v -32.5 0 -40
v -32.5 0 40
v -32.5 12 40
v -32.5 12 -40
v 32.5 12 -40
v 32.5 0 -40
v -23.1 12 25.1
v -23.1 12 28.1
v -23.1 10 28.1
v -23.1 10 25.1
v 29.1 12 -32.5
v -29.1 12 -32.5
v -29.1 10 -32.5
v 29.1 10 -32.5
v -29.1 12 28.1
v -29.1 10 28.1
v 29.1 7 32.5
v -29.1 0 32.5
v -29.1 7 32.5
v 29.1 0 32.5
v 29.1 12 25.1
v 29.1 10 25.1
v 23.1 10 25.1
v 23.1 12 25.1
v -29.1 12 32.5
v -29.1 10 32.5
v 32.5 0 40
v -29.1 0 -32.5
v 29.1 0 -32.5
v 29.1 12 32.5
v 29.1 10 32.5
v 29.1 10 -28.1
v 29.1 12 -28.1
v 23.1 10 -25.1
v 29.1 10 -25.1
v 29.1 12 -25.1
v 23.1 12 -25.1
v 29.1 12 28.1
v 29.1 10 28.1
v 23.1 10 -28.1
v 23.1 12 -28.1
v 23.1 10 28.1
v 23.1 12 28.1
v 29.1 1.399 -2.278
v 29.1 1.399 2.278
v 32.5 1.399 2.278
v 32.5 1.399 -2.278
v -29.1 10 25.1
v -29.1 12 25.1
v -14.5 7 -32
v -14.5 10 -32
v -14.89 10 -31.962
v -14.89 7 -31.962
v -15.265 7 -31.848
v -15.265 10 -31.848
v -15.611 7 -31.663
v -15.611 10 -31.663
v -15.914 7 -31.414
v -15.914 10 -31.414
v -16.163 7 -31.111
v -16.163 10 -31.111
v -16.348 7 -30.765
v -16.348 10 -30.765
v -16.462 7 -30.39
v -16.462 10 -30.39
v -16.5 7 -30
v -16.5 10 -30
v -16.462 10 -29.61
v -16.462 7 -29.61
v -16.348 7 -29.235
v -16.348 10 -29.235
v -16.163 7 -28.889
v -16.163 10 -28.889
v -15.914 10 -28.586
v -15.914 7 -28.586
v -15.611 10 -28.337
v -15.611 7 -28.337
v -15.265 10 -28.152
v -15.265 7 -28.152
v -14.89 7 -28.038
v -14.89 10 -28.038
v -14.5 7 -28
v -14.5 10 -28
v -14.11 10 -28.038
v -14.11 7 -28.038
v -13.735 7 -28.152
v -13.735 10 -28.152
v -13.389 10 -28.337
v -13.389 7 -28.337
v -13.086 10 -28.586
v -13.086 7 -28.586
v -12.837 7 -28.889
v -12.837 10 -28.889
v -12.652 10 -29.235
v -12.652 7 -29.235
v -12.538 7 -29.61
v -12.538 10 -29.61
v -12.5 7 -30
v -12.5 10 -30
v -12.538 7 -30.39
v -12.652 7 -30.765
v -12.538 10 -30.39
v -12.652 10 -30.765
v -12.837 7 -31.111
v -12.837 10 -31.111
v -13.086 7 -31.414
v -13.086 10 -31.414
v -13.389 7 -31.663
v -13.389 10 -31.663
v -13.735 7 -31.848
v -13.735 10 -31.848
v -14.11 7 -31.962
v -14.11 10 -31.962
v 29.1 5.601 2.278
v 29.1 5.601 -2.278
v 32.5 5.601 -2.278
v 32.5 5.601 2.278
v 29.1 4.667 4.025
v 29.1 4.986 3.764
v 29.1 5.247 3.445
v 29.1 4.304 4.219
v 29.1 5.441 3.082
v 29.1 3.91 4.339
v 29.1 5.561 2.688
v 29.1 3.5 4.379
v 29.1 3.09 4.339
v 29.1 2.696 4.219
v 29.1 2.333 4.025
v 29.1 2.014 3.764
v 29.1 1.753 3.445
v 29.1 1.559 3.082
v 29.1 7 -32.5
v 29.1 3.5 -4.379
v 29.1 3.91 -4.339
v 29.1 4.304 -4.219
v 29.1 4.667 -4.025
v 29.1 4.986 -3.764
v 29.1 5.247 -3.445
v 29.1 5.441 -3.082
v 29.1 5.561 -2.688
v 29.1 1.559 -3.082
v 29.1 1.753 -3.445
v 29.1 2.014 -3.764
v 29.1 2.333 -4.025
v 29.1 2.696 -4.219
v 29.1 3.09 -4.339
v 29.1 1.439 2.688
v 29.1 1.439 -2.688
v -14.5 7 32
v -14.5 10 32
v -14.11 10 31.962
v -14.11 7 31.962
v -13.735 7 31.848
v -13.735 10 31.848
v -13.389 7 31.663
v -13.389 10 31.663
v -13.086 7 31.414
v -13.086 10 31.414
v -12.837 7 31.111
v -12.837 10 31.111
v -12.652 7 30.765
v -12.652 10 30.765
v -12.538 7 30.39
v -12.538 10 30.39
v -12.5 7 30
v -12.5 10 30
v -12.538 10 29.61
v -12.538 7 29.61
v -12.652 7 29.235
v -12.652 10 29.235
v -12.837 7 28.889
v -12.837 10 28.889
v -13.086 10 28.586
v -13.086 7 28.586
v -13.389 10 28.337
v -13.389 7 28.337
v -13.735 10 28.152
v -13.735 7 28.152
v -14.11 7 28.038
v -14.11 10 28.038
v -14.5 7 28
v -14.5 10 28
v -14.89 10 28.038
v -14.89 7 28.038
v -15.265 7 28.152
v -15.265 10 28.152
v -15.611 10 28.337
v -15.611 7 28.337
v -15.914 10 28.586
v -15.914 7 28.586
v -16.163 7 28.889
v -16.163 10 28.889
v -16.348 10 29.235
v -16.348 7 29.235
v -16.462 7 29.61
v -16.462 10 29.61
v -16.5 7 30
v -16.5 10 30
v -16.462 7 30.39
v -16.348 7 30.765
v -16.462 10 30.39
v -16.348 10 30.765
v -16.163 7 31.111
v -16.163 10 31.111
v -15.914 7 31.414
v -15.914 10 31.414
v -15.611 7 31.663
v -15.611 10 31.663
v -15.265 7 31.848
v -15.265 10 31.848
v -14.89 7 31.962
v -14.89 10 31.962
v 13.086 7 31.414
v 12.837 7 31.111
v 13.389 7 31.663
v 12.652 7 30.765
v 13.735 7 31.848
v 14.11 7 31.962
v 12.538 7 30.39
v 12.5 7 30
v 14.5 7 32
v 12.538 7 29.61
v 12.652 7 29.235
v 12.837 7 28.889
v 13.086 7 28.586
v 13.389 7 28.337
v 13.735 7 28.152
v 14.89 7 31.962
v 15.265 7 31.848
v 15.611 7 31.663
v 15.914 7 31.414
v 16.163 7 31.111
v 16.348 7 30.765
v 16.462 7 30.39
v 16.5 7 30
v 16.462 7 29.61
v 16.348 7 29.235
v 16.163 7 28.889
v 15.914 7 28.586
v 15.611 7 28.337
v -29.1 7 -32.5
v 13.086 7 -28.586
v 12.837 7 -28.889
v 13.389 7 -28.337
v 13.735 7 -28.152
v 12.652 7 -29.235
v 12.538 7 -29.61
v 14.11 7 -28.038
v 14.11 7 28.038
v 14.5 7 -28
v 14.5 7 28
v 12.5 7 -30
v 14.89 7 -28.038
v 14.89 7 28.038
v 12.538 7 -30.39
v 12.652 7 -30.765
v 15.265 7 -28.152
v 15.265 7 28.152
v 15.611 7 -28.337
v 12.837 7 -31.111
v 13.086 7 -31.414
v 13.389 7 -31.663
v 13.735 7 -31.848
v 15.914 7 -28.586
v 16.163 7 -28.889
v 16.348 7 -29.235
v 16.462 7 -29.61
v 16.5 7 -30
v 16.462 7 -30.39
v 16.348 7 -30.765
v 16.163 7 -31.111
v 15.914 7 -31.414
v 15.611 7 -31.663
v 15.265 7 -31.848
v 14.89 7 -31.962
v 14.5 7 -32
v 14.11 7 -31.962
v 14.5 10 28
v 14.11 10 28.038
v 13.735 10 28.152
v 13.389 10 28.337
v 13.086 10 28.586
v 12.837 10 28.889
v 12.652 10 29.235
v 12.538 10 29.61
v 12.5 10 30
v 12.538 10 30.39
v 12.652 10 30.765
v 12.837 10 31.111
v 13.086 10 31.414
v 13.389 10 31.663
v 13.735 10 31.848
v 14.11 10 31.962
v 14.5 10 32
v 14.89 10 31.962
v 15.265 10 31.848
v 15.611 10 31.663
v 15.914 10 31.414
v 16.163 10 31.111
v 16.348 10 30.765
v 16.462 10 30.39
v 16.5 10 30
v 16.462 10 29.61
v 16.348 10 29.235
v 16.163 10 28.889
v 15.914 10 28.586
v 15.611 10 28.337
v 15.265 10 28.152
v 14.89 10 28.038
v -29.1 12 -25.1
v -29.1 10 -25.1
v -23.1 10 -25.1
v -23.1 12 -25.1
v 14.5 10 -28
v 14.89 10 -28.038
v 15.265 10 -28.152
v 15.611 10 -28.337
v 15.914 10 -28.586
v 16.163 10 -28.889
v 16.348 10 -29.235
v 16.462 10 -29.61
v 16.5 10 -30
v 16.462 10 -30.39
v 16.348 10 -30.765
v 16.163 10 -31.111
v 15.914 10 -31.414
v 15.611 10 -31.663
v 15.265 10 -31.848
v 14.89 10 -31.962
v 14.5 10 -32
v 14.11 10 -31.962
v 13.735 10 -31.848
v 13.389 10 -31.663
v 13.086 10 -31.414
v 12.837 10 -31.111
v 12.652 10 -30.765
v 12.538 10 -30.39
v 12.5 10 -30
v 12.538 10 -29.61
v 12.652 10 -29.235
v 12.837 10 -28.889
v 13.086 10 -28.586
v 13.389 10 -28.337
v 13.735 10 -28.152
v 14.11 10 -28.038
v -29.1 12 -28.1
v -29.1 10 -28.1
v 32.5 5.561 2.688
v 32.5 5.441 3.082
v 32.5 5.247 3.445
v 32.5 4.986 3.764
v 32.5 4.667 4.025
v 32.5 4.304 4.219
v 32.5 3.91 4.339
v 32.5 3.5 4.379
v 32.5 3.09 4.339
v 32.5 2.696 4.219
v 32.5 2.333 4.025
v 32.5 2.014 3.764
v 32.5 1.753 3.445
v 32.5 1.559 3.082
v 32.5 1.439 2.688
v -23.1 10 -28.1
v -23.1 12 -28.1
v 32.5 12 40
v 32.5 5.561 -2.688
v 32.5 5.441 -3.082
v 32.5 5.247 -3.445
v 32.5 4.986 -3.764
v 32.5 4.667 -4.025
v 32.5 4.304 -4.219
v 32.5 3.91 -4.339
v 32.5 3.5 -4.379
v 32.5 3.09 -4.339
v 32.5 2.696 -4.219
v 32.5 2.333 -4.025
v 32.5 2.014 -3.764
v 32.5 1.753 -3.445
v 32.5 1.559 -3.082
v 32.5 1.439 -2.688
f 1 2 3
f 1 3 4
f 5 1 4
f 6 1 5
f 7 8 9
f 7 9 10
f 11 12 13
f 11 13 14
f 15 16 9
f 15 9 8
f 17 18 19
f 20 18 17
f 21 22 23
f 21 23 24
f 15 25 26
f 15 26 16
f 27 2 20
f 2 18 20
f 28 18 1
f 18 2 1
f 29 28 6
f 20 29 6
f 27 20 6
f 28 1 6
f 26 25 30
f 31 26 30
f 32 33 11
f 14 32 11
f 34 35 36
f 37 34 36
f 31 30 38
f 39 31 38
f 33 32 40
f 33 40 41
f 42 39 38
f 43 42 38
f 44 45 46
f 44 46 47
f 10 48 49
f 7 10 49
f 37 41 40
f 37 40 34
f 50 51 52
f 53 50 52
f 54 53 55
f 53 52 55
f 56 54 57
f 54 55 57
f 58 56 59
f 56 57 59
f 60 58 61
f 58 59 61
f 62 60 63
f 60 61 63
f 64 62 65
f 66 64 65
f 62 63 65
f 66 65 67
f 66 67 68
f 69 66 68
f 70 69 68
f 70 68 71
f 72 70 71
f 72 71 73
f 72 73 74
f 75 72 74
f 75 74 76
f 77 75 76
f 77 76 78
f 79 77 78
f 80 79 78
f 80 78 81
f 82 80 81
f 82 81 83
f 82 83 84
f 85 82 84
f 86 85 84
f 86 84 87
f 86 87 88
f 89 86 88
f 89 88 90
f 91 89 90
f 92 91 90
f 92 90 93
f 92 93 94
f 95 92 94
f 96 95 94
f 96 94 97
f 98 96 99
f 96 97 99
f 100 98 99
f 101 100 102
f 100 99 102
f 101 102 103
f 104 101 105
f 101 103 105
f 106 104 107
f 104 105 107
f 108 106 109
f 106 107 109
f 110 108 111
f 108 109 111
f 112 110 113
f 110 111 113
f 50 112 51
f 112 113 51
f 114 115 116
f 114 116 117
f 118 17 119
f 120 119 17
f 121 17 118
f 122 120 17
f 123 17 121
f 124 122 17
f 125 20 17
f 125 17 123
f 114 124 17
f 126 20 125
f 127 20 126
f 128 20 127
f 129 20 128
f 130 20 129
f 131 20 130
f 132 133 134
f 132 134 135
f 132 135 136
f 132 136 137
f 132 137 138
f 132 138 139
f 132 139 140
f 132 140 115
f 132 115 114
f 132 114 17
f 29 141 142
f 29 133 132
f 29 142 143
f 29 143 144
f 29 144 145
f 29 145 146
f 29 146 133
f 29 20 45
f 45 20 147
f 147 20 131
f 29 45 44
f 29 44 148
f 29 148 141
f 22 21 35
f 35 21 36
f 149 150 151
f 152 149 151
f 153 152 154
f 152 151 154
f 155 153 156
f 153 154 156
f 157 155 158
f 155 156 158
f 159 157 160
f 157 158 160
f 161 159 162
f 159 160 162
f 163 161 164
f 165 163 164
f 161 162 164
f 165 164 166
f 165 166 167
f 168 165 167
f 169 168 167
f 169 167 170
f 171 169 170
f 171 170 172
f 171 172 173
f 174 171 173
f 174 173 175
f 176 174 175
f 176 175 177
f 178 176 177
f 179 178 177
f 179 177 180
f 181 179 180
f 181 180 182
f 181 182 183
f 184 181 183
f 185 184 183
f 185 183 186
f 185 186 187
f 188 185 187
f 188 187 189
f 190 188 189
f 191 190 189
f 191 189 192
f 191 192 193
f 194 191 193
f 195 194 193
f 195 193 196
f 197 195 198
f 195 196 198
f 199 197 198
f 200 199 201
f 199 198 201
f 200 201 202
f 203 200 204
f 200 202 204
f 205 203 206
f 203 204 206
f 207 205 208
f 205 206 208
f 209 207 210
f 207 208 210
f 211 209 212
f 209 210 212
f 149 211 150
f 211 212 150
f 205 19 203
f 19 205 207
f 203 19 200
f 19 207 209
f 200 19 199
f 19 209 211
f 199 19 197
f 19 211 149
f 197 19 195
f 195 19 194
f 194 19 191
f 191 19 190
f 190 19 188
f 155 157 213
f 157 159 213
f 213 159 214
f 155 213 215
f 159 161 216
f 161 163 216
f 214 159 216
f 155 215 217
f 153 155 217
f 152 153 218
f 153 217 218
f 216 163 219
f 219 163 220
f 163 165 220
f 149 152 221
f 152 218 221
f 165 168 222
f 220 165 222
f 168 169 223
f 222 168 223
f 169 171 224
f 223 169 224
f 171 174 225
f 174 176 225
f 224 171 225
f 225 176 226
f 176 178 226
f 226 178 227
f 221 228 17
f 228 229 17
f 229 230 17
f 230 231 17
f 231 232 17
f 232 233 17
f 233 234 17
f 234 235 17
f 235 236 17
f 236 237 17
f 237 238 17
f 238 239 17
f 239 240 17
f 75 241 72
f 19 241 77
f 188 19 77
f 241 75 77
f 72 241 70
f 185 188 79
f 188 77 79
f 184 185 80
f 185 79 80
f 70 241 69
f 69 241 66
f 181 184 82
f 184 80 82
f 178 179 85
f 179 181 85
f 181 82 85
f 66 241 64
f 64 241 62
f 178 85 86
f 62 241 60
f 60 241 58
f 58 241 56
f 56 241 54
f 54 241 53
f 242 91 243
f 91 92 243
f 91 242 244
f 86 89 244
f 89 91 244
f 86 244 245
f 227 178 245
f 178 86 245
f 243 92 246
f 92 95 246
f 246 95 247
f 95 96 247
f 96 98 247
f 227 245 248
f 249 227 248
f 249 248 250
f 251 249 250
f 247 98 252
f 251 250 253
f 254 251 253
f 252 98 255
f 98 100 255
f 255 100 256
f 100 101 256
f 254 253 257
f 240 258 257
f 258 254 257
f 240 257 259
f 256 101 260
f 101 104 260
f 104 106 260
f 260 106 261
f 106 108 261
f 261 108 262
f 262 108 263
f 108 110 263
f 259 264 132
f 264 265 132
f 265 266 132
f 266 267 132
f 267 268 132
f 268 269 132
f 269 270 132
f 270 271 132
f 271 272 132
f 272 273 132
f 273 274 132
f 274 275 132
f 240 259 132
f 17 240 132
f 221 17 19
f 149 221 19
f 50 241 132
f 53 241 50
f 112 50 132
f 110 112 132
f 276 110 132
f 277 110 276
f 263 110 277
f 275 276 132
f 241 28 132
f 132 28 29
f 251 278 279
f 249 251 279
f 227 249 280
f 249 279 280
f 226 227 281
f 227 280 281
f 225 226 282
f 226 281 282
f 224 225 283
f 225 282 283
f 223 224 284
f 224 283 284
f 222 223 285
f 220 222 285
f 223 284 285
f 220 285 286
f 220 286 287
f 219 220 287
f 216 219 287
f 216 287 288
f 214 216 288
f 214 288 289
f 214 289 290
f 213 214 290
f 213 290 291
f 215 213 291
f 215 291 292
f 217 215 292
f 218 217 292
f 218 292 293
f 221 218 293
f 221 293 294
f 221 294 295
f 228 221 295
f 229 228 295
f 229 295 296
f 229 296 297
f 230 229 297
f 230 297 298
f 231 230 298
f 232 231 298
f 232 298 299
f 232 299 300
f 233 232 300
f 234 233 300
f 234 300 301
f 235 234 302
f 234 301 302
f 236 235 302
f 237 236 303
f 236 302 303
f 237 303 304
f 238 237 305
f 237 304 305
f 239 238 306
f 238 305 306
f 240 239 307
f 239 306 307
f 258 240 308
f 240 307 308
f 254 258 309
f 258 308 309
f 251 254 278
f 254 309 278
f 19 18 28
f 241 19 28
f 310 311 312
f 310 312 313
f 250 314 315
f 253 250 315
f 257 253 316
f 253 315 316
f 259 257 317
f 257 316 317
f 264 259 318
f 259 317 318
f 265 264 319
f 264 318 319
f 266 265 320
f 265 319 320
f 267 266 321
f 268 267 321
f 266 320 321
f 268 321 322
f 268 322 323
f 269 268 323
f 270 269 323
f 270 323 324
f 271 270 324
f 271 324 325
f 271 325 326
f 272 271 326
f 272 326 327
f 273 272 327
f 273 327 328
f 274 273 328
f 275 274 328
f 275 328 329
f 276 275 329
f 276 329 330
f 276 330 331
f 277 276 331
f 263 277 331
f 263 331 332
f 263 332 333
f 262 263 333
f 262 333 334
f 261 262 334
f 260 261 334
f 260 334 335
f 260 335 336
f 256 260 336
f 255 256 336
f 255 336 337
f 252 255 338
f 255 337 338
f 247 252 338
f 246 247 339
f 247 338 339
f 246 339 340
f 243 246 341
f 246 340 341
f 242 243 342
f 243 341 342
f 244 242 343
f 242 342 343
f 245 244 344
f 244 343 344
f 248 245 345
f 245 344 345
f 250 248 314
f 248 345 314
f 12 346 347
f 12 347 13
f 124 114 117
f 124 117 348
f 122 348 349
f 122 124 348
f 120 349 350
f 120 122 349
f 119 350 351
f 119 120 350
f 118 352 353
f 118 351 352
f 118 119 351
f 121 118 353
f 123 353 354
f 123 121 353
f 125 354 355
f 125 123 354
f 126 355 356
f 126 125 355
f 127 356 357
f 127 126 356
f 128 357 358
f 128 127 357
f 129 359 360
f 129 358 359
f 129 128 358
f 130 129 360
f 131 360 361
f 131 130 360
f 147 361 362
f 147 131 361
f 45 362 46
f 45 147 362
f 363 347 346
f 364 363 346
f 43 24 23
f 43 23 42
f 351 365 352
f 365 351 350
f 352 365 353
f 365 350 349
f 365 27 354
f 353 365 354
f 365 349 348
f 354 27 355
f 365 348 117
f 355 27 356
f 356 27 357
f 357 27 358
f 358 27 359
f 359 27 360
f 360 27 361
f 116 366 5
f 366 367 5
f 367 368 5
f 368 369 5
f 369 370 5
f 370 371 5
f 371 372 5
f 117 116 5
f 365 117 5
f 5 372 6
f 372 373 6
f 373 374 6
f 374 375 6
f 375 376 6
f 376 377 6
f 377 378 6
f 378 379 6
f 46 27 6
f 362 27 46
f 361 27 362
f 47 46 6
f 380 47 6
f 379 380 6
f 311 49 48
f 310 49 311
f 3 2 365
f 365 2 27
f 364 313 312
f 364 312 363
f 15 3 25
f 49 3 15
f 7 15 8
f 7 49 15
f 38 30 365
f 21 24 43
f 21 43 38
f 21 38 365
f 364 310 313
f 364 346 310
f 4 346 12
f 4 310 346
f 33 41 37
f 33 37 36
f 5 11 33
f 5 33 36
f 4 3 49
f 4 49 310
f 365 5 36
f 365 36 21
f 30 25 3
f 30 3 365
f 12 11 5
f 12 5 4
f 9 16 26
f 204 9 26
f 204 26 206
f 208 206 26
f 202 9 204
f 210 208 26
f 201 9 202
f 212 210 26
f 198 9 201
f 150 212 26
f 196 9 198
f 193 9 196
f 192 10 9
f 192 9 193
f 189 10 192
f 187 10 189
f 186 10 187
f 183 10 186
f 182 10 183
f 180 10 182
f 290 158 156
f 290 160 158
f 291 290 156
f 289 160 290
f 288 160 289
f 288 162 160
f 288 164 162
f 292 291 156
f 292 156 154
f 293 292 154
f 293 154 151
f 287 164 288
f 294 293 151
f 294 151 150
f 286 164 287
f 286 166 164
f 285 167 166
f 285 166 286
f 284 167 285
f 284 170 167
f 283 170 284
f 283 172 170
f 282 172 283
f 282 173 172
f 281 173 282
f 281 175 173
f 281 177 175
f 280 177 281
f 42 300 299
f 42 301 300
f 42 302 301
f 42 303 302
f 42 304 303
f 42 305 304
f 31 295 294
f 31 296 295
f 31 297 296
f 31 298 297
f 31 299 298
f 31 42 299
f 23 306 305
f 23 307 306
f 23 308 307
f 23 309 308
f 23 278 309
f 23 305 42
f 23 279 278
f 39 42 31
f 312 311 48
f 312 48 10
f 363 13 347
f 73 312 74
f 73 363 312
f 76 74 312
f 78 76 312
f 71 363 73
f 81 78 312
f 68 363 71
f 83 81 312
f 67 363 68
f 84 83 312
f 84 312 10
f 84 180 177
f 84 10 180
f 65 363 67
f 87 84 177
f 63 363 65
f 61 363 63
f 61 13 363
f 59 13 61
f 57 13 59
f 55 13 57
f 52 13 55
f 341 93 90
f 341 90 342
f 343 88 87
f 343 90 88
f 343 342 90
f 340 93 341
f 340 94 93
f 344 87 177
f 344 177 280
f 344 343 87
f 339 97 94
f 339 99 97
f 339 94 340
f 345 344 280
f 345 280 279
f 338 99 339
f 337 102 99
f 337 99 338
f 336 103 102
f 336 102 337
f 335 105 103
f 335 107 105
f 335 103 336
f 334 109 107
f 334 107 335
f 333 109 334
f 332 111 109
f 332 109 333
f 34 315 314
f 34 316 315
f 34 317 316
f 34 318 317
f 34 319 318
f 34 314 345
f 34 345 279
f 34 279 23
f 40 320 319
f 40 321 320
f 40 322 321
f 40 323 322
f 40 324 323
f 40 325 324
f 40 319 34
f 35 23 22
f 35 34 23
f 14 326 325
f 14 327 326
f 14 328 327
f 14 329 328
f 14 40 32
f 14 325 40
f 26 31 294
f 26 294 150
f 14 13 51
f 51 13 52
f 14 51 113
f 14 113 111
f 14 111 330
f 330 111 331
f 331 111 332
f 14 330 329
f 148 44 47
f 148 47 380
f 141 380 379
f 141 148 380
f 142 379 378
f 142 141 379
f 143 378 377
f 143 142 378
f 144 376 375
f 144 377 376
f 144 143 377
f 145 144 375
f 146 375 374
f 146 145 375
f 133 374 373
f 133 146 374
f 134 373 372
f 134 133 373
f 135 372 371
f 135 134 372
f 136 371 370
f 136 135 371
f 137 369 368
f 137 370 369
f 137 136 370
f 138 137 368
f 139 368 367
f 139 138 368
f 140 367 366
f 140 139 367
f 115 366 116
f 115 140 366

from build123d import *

# Parameters (mm, degrees)
SKETCH1_W           = 65
SKETCH1_H           = 80
BOSS_EXTRUDE1_DEPTH = 12
SKETCH3_W           = 58.2
SKETCH3_H           = 65
CUT_EXTRUDE4_DEPTH  = 2
SKETCH6_R           = 2
CUT_EXTRUDE5_DEPTH  = 10
SKETCH7_W           = 58.2
SKETCH7_H           = 65
CUT_EXTRUDE6_DEPTH  = 7
CUT_EXTRUDE8_DEPTH  = 6
SKETCH11_W          = 3
SKETCH11_H          = 2
BOSS_EXTRUDE3_DEPTH = 6
SKETCH13_W          = 3
SKETCH13_H          = 2
BOSS_EXTRUDE4_DEPTH = 6


with BuildPart() as part:
    # Sketch1 → Boss-Extrude1 (new body)
    with BuildSketch(Plane(origin=(0, 0, 0), x_dir=(1, 0, 0), z_dir=(0, 1, 0))):
        Rectangle(SKETCH1_W, SKETCH1_H)
    extrude(amount=BOSS_EXTRUDE1_DEPTH)

    # Sketch3 → Cut-Extrude4 (cut)
    with BuildSketch(Plane(origin=(0, 12, 0), x_dir=(1, 0, 0), z_dir=(0, 1, 0))):
        Rectangle(SKETCH3_W, SKETCH3_H)
    extrude(amount=-CUT_EXTRUDE4_DEPTH, mode=Mode.SUBTRACT)

    # Sketch6 → Cut-Extrude5 (cut)
    with BuildSketch(Plane(origin=(0, 10, 0), x_dir=(1, 0, 0), z_dir=(0, 1, 0))):
        with Locations(Location((14.5, 30, 0), (0, 0, 270))):  # turned: the seam where the file's is
            Circle(SKETCH6_R)
        with Locations(Location((-14.5, 30, 0), (0, 0, 90))):  # turned: the seam where the file's is
            Circle(SKETCH6_R)
        with Locations(Location((-14.5, -30, 0), (0, 0, 270))):  # turned: the seam where the file's is
            Circle(SKETCH6_R)
        with Locations(Location((14.5, -30, 0), (0, 0, 90))):  # turned: the seam where the file's is
            Circle(SKETCH6_R)
    extrude(amount=-CUT_EXTRUDE5_DEPTH, mode=Mode.SUBTRACT)

    # Sketch7 → Cut-Extrude6 (cut)
    with BuildSketch(Plane(origin=(0, 0, 0), x_dir=(1, 0, 0), z_dir=(0, 1, 0))):
        Rectangle(SKETCH7_W, SKETCH7_H)
    extrude(amount=CUT_EXTRUDE6_DEPTH, mode=Mode.SUBTRACT)

    # Sketch10 → Cut-Extrude8 (cut)
    with BuildSketch(Plane.ZY.offset(-29.1)):
        with BuildLine():
            Line((-2.277690302, 5.601430768), (2.277690302, 5.601430768))
            ThreePointArc((2.277690302, 5.601430768), (4.379121071, 3.5), (2.277690302, 1.398569232))
            Line((2.277690302, 1.398569232), (-2.277690302, 1.398569232))
            ThreePointArc((-2.277690302, 1.398569232), (-4.379121071, 3.5), (-2.277690302, 5.601430768))
        make_face()
    extrude(amount=-CUT_EXTRUDE8_DEPTH, mode=Mode.SUBTRACT)

    # Sketch11 → Boss-Extrude3 (add)
    with BuildSketch(Plane.ZY.offset(-29.1)):
        with Locations((-26.6, 11)):
            Rectangle(SKETCH11_W, SKETCH11_H)
        with Locations((26.6, 11)):
            Rectangle(SKETCH11_W, SKETCH11_H)
    extrude(amount=BOSS_EXTRUDE3_DEPTH)

    # Sketch13 → Boss-Extrude4 (add)
    with BuildSketch(Plane(origin=(-29.1, 0, 0), x_dir=(0, 0, -1), z_dir=(1, 0, 0))):
        with Locations((26.6, 11)):
            Rectangle(SKETCH13_W, SKETCH13_H)
        with Locations((-26.6, 11)):
            Rectangle(SKETCH13_W, SKETCH13_H)
    extrude(amount=BOSS_EXTRUDE4_DEPTH)


solid = part.part
